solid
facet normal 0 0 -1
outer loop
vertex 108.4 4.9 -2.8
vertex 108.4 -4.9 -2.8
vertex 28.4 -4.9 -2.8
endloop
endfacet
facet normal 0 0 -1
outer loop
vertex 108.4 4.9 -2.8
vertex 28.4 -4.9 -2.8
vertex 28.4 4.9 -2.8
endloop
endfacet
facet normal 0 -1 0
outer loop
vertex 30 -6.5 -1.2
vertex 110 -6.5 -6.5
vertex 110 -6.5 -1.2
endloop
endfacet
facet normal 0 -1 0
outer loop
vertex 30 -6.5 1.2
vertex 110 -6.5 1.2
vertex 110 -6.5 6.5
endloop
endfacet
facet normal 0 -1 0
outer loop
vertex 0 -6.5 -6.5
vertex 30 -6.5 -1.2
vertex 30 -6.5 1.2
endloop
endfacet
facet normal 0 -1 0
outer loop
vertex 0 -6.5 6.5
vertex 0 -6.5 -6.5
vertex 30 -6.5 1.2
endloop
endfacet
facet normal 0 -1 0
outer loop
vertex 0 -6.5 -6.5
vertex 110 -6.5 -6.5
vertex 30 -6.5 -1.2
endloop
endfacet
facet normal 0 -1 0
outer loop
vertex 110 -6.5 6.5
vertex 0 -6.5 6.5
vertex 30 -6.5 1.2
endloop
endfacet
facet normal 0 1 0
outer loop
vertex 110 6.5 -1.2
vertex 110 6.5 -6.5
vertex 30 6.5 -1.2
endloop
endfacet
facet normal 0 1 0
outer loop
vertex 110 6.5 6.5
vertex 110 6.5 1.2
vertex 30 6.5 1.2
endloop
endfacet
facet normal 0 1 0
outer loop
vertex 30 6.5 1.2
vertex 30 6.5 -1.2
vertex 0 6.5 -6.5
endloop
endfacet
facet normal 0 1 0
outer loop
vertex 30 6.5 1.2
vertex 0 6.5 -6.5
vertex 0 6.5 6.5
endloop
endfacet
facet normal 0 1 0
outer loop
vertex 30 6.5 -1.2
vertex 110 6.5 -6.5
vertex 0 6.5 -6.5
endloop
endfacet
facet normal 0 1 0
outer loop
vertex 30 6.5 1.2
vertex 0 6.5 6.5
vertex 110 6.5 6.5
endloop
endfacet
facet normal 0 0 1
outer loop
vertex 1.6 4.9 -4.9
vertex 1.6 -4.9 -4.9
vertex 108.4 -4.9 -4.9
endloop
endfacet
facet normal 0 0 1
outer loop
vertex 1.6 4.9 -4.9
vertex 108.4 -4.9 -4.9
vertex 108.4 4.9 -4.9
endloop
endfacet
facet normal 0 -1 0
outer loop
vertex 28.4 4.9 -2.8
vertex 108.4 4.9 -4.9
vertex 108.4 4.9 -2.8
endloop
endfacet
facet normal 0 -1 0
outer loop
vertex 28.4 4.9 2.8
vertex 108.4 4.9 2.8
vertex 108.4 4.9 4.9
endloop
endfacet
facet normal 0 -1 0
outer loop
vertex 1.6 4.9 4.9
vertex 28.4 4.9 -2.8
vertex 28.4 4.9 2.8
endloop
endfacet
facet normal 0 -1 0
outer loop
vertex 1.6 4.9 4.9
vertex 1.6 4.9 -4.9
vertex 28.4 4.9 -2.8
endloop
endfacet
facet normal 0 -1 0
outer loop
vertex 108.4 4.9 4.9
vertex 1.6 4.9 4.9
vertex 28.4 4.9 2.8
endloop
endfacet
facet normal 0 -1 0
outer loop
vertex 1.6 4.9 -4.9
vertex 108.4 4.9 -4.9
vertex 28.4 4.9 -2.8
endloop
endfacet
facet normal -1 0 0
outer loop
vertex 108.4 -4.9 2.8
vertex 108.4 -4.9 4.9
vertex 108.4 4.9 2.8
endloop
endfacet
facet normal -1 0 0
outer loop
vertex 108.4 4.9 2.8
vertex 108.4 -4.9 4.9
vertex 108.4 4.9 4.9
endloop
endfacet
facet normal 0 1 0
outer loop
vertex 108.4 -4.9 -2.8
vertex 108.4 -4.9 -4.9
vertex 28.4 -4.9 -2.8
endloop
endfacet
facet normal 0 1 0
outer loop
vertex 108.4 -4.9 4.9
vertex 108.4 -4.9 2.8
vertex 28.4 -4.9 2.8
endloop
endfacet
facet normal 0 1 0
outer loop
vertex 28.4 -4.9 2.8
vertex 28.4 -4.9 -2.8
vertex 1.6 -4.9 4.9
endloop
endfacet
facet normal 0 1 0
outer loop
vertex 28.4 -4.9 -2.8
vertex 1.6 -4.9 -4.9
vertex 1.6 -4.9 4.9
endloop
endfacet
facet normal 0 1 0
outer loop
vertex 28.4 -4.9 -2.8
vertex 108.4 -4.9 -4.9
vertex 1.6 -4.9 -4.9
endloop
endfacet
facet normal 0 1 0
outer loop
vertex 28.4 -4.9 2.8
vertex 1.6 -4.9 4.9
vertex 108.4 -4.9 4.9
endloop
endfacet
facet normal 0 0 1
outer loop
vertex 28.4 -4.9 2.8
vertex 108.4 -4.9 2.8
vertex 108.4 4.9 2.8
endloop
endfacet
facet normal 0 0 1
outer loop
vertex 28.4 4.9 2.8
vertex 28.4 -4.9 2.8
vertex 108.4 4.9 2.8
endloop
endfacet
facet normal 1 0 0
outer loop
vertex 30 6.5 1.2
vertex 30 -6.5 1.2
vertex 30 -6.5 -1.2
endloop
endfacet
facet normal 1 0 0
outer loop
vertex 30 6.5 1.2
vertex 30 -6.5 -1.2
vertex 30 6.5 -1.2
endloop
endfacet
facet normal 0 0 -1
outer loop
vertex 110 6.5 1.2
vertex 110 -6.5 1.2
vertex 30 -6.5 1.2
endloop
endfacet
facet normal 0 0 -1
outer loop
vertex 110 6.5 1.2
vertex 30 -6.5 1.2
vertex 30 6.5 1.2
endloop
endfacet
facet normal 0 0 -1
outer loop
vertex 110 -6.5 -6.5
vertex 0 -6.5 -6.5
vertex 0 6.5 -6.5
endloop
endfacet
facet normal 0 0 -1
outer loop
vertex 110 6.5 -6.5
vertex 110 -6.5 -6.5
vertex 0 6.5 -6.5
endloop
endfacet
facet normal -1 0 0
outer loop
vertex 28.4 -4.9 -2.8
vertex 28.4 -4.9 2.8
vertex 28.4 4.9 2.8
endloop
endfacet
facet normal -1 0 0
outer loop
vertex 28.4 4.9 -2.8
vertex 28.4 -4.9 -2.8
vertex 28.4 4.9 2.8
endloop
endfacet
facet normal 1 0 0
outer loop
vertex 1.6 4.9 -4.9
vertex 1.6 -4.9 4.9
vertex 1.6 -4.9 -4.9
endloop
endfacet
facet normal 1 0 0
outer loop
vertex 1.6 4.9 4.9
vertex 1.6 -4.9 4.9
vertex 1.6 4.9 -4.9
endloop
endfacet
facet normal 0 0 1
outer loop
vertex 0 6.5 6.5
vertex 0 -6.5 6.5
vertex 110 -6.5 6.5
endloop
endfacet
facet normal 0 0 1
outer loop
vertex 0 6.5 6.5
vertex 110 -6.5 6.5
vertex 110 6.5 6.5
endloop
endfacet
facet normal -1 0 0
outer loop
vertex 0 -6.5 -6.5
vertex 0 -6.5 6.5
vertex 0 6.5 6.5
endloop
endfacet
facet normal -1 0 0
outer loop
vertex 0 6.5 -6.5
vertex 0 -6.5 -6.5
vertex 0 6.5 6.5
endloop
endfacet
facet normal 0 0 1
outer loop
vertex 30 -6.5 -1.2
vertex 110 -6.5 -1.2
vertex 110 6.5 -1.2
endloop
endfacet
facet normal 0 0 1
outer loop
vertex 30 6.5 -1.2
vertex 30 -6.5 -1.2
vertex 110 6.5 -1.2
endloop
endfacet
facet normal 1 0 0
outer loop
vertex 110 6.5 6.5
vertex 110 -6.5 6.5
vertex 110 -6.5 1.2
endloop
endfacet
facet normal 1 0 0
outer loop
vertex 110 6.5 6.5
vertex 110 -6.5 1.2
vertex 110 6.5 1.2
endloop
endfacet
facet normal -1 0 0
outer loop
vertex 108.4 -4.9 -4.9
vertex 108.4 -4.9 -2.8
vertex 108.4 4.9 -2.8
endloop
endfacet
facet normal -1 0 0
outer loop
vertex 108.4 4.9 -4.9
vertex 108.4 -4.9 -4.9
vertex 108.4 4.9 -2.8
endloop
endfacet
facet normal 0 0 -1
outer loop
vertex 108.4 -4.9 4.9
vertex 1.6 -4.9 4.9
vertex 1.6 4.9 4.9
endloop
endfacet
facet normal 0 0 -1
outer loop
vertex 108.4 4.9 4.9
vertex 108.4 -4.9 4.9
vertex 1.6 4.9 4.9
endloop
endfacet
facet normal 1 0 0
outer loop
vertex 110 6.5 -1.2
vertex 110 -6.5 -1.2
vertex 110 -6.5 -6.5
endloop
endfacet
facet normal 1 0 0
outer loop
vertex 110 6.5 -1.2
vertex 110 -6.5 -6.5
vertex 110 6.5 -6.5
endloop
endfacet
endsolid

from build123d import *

# Parameters (mm, degrees)
F0_W     = 13
F0_H     = 13
F1_DEPTH = 110
F3_W     = 13
F3_H     = 2.4
F4_DEPTH = 80
F5_T     = -1.6


with BuildPart() as f1:
    # F0 (on Right) → F1 (new body)
    with BuildSketch(Plane.YZ):
        Rectangle(F0_W, F0_H)
    extrude(amount=F1_DEPTH)

    # F3 (on offset) → F4 (cut)
    with BuildSketch(Plane.YZ.offset(110)):
        Rectangle(F3_W, F3_H)
    extrude(amount=-F4_DEPTH, mode=Mode.SUBTRACT)

    # F5 (hollow: no face is removed)
    offset(amount=F5_T, kind=Kind.INTERSECTION, mode=Mode.SUBTRACT)


solid = f1.part
